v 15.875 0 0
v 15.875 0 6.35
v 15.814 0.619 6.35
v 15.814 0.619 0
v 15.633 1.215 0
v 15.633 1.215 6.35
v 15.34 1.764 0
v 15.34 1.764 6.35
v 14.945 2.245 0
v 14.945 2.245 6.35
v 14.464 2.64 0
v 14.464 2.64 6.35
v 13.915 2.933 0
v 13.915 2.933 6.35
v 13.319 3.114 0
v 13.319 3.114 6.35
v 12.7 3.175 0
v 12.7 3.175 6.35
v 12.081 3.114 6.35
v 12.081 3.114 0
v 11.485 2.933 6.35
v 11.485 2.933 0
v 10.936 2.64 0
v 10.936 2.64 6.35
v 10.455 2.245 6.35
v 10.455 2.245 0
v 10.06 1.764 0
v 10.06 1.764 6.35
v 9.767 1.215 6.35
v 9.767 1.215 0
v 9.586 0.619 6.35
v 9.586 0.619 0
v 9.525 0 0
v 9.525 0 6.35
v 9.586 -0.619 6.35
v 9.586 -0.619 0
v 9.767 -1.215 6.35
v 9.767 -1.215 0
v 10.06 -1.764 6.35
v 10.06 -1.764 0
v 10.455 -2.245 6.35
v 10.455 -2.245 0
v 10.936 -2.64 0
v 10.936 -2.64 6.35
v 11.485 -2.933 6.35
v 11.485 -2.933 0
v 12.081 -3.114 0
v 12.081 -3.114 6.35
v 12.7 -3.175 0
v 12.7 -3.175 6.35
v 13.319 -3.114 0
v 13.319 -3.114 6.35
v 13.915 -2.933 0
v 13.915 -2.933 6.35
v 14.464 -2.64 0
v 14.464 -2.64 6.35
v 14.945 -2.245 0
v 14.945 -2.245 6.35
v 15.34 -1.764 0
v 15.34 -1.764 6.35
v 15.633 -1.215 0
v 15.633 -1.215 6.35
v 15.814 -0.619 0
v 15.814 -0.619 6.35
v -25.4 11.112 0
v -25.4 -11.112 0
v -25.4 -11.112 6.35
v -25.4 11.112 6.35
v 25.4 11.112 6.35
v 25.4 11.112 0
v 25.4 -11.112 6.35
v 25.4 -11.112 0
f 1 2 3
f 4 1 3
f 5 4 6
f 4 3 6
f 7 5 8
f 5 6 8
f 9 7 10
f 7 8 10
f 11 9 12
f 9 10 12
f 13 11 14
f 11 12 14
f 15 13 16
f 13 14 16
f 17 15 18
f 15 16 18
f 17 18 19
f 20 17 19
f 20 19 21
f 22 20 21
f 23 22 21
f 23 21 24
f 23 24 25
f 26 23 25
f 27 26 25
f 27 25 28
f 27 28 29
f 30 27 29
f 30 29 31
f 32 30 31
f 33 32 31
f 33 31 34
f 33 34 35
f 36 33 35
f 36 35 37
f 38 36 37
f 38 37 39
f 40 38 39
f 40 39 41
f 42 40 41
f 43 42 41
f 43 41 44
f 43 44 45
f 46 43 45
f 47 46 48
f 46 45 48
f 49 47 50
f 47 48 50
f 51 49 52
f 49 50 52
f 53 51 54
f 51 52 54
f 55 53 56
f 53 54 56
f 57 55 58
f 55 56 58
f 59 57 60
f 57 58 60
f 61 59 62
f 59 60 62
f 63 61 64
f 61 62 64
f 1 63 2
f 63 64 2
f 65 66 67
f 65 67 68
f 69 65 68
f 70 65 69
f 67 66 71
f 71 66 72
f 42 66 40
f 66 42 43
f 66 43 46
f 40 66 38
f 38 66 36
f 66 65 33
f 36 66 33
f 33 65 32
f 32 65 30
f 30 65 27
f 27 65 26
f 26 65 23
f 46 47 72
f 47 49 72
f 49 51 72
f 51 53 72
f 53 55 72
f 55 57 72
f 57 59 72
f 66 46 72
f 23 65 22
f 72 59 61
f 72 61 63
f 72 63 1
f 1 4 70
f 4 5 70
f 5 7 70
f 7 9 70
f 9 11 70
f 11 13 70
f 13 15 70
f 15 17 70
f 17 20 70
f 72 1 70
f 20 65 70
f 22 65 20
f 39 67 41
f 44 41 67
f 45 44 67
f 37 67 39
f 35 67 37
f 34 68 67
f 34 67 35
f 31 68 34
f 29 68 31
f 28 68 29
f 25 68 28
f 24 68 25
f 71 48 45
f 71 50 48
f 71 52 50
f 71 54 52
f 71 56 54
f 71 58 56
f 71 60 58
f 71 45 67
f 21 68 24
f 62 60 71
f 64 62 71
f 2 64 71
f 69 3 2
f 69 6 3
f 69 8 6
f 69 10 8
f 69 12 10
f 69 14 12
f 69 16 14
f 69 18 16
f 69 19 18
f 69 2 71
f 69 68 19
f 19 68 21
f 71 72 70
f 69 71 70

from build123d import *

# Parameters (mm, degrees)
SKETCH1_R                   = 2.540797377
SKETCH1_W                   = 50.8
SKETCH1_H                   = 22.225
BOSS_EXTRUDE1_DEPTH         = 6.35
F_1_4_0_25_DIAMETER_HOLE1_D = 6.35


with BuildPart() as part:
    # Sketch1 → Boss-Extrude1 (new body)
    with BuildSketch(Plane.XY):
        with Locations((12.7, 0)):
            Circle(SKETCH1_R)
        Rectangle(SKETCH1_W, SKETCH1_H)
        with Locations((12.7, 0)):
            Circle(SKETCH1_R, mode=Mode.SUBTRACT)
    extrude(amount=BOSS_EXTRUDE1_DEPTH)

    # 1/4 (0.25) Diameter Hole1 (through all)
    with Locations(Plane(origin=(0, 0, 0), x_dir=(-1, 0, 0), z_dir=(0, 0, -1))):
        with Locations((-12.7, 0)):
            Hole(F_1_4_0_25_DIAMETER_HOLE1_D / 2)


solid = part.part
